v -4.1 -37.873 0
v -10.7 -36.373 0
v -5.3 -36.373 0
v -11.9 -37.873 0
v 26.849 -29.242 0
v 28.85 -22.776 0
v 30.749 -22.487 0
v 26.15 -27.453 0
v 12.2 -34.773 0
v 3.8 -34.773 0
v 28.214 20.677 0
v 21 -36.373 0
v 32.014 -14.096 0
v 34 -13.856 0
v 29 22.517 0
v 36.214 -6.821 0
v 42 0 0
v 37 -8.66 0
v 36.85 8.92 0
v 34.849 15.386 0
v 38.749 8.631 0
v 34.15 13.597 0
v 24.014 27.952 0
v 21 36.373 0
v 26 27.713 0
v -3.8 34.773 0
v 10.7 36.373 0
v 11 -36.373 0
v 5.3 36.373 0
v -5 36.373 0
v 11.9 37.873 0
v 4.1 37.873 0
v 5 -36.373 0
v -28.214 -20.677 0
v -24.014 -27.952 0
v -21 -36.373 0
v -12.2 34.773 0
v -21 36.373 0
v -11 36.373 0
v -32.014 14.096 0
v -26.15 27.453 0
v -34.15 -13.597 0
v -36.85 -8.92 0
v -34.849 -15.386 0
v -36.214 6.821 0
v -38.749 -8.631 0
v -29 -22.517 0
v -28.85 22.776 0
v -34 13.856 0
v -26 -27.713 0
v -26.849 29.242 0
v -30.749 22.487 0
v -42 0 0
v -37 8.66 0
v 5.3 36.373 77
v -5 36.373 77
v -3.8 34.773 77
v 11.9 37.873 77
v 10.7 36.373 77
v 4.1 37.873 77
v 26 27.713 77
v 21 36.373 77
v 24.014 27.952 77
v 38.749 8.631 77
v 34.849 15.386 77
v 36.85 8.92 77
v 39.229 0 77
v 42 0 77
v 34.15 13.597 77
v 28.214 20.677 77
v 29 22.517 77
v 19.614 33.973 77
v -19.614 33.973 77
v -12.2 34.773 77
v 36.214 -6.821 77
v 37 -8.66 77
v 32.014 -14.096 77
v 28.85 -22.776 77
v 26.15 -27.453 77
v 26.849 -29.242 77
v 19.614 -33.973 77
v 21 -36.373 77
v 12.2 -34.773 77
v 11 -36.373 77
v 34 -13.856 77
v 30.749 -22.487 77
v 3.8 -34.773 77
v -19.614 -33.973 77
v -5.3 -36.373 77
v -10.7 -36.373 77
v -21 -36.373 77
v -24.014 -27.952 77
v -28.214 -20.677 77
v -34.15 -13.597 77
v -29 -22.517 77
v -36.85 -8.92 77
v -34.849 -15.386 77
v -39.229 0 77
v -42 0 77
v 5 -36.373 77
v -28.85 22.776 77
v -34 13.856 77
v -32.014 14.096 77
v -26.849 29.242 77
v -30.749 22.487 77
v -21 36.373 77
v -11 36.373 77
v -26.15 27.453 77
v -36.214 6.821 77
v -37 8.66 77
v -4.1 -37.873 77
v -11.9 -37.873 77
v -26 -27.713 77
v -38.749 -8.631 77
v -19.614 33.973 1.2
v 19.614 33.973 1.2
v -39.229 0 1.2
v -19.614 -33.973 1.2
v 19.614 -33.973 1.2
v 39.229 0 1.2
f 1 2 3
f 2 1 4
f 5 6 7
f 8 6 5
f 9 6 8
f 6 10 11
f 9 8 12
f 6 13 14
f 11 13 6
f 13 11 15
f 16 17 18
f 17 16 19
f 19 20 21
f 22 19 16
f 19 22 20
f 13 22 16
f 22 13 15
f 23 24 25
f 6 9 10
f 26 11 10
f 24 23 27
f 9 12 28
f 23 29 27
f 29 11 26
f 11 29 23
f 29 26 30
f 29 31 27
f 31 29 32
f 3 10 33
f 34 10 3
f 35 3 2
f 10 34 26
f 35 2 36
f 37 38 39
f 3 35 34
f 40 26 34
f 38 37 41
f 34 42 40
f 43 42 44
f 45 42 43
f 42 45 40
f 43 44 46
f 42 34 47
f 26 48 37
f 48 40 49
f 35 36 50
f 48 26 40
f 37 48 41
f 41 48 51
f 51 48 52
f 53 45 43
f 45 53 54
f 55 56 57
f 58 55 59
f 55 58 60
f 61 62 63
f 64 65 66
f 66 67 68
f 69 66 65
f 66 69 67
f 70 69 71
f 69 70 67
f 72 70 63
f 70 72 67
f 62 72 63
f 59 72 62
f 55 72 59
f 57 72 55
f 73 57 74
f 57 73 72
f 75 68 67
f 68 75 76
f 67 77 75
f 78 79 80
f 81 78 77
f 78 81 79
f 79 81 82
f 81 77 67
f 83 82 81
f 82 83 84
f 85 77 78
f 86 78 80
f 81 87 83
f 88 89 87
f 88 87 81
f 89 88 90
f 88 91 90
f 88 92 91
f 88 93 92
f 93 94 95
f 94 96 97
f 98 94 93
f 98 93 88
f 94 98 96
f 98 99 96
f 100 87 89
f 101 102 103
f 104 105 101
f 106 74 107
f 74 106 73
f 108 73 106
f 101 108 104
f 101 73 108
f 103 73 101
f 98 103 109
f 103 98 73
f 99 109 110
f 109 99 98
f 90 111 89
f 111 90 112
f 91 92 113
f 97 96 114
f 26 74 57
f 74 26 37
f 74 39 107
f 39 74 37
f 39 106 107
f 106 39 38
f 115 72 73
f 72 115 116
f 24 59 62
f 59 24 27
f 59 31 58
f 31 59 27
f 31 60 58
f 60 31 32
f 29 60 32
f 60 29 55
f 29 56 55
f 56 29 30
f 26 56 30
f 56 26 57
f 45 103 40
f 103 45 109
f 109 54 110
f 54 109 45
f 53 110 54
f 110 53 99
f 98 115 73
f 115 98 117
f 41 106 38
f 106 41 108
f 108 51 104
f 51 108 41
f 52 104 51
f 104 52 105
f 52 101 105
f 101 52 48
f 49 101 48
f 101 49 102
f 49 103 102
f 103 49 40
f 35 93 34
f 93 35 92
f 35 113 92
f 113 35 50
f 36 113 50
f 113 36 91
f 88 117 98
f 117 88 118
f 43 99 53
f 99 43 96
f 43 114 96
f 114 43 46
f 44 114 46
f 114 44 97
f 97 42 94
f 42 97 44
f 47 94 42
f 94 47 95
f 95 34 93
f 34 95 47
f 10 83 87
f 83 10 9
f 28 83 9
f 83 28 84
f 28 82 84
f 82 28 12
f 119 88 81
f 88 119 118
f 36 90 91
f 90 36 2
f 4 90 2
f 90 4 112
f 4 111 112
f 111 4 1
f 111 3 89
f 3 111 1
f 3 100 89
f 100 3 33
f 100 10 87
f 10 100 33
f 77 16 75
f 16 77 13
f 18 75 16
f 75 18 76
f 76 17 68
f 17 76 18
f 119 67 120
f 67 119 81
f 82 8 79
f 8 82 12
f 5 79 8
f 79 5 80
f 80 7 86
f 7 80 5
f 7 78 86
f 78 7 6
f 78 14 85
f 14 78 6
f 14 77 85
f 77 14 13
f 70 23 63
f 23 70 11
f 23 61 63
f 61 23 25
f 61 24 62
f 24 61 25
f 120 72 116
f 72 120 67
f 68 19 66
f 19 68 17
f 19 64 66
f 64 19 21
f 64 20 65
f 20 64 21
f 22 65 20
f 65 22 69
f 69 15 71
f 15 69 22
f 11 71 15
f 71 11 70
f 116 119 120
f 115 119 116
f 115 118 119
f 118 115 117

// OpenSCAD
outerRadiusLong = 42;
thickness = 2.4;
bottomThickness = 1.2;
height = 77;

gripDepth = 1.6;
gripStartWidth = 6;
gripEndWidth = gripStartWidth + 2.4;
gripFrontWiggle = 0.1;
gripSideWiggle = 0.3;
gripOffset = 10;

outerRadiusShort = outerRadiusLong * sqrt(3) / 2;
innerRadiusLong = outerRadiusLong - thickness; // TODO: that's slightly too long

module wall() {
    linear_extrude(height) {
        difference() {
            insetX = gripOffset + gripStartWidth / 2;
            square([outerRadiusLong, thickness]);
            
            polygon([
                [insetX - gripStartWidth / 2, thickness],
                [insetX - gripEndWidth / 2, thickness - gripDepth],
                [insetX + gripEndWidth / 2, thickness - gripDepth],
                [insetX + gripStartWidth / 2, thickness]
            ]);
        }
        
        outsetX = outerRadiusLong - gripOffset - gripStartWidth / 2;
        polygon([
                [outsetX - gripStartWidth / 2 + gripSideWiggle, thickness],
                [outsetX - gripEndWidth / 2 + gripSideWiggle, thickness + gripDepth - gripFrontWiggle],
                [outsetX + gripEndWidth / 2 - gripSideWiggle, thickness + gripDepth - gripFrontWiggle],
                [outsetX + gripStartWidth / 2 - gripSideWiggle, thickness]
            ]);
    }
}

module hexFrame() {
    for(r = [0:60:360]) {
        rotate([0, 0, r])
        translate([-outerRadiusLong / 2, outerRadiusShort - thickness, 0])
        wall();
    }
}

module hexSolidBottom() {
    rotate([0, 0, 30])
    linear_extrude(bottomThickness)
    polygon([
        [sin(0) * innerRadiusLong, cos(0) * innerRadiusLong],
        [sin(60) * innerRadiusLong, cos(60) * innerRadiusLong],
        [sin(120) * innerRadiusLong, cos(120) * innerRadiusLong],
        [sin(180) * innerRadiusLong, cos(180) * innerRadiusLong],
        [sin(240) * innerRadiusLong, cos(240) * innerRadiusLong],
        [sin(300) * innerRadiusLong, cos(300) * innerRadiusLong]
    ]);
}

module fittingTest() {
    for(r = [0:60:60]) {
        rotate([0, 0, r])
        translate([-outerRadiusLong / 2, outerRadiusShort - thickness, 0])
        wall();
    }
}

hexSolidBottom();
hexFrame();

//fitDistance = 0.1 + outerRadiusShort * 2;
//translate([sin(60) * fitDistance, cos(60) * fitDistance, 0]) hexFrame();
